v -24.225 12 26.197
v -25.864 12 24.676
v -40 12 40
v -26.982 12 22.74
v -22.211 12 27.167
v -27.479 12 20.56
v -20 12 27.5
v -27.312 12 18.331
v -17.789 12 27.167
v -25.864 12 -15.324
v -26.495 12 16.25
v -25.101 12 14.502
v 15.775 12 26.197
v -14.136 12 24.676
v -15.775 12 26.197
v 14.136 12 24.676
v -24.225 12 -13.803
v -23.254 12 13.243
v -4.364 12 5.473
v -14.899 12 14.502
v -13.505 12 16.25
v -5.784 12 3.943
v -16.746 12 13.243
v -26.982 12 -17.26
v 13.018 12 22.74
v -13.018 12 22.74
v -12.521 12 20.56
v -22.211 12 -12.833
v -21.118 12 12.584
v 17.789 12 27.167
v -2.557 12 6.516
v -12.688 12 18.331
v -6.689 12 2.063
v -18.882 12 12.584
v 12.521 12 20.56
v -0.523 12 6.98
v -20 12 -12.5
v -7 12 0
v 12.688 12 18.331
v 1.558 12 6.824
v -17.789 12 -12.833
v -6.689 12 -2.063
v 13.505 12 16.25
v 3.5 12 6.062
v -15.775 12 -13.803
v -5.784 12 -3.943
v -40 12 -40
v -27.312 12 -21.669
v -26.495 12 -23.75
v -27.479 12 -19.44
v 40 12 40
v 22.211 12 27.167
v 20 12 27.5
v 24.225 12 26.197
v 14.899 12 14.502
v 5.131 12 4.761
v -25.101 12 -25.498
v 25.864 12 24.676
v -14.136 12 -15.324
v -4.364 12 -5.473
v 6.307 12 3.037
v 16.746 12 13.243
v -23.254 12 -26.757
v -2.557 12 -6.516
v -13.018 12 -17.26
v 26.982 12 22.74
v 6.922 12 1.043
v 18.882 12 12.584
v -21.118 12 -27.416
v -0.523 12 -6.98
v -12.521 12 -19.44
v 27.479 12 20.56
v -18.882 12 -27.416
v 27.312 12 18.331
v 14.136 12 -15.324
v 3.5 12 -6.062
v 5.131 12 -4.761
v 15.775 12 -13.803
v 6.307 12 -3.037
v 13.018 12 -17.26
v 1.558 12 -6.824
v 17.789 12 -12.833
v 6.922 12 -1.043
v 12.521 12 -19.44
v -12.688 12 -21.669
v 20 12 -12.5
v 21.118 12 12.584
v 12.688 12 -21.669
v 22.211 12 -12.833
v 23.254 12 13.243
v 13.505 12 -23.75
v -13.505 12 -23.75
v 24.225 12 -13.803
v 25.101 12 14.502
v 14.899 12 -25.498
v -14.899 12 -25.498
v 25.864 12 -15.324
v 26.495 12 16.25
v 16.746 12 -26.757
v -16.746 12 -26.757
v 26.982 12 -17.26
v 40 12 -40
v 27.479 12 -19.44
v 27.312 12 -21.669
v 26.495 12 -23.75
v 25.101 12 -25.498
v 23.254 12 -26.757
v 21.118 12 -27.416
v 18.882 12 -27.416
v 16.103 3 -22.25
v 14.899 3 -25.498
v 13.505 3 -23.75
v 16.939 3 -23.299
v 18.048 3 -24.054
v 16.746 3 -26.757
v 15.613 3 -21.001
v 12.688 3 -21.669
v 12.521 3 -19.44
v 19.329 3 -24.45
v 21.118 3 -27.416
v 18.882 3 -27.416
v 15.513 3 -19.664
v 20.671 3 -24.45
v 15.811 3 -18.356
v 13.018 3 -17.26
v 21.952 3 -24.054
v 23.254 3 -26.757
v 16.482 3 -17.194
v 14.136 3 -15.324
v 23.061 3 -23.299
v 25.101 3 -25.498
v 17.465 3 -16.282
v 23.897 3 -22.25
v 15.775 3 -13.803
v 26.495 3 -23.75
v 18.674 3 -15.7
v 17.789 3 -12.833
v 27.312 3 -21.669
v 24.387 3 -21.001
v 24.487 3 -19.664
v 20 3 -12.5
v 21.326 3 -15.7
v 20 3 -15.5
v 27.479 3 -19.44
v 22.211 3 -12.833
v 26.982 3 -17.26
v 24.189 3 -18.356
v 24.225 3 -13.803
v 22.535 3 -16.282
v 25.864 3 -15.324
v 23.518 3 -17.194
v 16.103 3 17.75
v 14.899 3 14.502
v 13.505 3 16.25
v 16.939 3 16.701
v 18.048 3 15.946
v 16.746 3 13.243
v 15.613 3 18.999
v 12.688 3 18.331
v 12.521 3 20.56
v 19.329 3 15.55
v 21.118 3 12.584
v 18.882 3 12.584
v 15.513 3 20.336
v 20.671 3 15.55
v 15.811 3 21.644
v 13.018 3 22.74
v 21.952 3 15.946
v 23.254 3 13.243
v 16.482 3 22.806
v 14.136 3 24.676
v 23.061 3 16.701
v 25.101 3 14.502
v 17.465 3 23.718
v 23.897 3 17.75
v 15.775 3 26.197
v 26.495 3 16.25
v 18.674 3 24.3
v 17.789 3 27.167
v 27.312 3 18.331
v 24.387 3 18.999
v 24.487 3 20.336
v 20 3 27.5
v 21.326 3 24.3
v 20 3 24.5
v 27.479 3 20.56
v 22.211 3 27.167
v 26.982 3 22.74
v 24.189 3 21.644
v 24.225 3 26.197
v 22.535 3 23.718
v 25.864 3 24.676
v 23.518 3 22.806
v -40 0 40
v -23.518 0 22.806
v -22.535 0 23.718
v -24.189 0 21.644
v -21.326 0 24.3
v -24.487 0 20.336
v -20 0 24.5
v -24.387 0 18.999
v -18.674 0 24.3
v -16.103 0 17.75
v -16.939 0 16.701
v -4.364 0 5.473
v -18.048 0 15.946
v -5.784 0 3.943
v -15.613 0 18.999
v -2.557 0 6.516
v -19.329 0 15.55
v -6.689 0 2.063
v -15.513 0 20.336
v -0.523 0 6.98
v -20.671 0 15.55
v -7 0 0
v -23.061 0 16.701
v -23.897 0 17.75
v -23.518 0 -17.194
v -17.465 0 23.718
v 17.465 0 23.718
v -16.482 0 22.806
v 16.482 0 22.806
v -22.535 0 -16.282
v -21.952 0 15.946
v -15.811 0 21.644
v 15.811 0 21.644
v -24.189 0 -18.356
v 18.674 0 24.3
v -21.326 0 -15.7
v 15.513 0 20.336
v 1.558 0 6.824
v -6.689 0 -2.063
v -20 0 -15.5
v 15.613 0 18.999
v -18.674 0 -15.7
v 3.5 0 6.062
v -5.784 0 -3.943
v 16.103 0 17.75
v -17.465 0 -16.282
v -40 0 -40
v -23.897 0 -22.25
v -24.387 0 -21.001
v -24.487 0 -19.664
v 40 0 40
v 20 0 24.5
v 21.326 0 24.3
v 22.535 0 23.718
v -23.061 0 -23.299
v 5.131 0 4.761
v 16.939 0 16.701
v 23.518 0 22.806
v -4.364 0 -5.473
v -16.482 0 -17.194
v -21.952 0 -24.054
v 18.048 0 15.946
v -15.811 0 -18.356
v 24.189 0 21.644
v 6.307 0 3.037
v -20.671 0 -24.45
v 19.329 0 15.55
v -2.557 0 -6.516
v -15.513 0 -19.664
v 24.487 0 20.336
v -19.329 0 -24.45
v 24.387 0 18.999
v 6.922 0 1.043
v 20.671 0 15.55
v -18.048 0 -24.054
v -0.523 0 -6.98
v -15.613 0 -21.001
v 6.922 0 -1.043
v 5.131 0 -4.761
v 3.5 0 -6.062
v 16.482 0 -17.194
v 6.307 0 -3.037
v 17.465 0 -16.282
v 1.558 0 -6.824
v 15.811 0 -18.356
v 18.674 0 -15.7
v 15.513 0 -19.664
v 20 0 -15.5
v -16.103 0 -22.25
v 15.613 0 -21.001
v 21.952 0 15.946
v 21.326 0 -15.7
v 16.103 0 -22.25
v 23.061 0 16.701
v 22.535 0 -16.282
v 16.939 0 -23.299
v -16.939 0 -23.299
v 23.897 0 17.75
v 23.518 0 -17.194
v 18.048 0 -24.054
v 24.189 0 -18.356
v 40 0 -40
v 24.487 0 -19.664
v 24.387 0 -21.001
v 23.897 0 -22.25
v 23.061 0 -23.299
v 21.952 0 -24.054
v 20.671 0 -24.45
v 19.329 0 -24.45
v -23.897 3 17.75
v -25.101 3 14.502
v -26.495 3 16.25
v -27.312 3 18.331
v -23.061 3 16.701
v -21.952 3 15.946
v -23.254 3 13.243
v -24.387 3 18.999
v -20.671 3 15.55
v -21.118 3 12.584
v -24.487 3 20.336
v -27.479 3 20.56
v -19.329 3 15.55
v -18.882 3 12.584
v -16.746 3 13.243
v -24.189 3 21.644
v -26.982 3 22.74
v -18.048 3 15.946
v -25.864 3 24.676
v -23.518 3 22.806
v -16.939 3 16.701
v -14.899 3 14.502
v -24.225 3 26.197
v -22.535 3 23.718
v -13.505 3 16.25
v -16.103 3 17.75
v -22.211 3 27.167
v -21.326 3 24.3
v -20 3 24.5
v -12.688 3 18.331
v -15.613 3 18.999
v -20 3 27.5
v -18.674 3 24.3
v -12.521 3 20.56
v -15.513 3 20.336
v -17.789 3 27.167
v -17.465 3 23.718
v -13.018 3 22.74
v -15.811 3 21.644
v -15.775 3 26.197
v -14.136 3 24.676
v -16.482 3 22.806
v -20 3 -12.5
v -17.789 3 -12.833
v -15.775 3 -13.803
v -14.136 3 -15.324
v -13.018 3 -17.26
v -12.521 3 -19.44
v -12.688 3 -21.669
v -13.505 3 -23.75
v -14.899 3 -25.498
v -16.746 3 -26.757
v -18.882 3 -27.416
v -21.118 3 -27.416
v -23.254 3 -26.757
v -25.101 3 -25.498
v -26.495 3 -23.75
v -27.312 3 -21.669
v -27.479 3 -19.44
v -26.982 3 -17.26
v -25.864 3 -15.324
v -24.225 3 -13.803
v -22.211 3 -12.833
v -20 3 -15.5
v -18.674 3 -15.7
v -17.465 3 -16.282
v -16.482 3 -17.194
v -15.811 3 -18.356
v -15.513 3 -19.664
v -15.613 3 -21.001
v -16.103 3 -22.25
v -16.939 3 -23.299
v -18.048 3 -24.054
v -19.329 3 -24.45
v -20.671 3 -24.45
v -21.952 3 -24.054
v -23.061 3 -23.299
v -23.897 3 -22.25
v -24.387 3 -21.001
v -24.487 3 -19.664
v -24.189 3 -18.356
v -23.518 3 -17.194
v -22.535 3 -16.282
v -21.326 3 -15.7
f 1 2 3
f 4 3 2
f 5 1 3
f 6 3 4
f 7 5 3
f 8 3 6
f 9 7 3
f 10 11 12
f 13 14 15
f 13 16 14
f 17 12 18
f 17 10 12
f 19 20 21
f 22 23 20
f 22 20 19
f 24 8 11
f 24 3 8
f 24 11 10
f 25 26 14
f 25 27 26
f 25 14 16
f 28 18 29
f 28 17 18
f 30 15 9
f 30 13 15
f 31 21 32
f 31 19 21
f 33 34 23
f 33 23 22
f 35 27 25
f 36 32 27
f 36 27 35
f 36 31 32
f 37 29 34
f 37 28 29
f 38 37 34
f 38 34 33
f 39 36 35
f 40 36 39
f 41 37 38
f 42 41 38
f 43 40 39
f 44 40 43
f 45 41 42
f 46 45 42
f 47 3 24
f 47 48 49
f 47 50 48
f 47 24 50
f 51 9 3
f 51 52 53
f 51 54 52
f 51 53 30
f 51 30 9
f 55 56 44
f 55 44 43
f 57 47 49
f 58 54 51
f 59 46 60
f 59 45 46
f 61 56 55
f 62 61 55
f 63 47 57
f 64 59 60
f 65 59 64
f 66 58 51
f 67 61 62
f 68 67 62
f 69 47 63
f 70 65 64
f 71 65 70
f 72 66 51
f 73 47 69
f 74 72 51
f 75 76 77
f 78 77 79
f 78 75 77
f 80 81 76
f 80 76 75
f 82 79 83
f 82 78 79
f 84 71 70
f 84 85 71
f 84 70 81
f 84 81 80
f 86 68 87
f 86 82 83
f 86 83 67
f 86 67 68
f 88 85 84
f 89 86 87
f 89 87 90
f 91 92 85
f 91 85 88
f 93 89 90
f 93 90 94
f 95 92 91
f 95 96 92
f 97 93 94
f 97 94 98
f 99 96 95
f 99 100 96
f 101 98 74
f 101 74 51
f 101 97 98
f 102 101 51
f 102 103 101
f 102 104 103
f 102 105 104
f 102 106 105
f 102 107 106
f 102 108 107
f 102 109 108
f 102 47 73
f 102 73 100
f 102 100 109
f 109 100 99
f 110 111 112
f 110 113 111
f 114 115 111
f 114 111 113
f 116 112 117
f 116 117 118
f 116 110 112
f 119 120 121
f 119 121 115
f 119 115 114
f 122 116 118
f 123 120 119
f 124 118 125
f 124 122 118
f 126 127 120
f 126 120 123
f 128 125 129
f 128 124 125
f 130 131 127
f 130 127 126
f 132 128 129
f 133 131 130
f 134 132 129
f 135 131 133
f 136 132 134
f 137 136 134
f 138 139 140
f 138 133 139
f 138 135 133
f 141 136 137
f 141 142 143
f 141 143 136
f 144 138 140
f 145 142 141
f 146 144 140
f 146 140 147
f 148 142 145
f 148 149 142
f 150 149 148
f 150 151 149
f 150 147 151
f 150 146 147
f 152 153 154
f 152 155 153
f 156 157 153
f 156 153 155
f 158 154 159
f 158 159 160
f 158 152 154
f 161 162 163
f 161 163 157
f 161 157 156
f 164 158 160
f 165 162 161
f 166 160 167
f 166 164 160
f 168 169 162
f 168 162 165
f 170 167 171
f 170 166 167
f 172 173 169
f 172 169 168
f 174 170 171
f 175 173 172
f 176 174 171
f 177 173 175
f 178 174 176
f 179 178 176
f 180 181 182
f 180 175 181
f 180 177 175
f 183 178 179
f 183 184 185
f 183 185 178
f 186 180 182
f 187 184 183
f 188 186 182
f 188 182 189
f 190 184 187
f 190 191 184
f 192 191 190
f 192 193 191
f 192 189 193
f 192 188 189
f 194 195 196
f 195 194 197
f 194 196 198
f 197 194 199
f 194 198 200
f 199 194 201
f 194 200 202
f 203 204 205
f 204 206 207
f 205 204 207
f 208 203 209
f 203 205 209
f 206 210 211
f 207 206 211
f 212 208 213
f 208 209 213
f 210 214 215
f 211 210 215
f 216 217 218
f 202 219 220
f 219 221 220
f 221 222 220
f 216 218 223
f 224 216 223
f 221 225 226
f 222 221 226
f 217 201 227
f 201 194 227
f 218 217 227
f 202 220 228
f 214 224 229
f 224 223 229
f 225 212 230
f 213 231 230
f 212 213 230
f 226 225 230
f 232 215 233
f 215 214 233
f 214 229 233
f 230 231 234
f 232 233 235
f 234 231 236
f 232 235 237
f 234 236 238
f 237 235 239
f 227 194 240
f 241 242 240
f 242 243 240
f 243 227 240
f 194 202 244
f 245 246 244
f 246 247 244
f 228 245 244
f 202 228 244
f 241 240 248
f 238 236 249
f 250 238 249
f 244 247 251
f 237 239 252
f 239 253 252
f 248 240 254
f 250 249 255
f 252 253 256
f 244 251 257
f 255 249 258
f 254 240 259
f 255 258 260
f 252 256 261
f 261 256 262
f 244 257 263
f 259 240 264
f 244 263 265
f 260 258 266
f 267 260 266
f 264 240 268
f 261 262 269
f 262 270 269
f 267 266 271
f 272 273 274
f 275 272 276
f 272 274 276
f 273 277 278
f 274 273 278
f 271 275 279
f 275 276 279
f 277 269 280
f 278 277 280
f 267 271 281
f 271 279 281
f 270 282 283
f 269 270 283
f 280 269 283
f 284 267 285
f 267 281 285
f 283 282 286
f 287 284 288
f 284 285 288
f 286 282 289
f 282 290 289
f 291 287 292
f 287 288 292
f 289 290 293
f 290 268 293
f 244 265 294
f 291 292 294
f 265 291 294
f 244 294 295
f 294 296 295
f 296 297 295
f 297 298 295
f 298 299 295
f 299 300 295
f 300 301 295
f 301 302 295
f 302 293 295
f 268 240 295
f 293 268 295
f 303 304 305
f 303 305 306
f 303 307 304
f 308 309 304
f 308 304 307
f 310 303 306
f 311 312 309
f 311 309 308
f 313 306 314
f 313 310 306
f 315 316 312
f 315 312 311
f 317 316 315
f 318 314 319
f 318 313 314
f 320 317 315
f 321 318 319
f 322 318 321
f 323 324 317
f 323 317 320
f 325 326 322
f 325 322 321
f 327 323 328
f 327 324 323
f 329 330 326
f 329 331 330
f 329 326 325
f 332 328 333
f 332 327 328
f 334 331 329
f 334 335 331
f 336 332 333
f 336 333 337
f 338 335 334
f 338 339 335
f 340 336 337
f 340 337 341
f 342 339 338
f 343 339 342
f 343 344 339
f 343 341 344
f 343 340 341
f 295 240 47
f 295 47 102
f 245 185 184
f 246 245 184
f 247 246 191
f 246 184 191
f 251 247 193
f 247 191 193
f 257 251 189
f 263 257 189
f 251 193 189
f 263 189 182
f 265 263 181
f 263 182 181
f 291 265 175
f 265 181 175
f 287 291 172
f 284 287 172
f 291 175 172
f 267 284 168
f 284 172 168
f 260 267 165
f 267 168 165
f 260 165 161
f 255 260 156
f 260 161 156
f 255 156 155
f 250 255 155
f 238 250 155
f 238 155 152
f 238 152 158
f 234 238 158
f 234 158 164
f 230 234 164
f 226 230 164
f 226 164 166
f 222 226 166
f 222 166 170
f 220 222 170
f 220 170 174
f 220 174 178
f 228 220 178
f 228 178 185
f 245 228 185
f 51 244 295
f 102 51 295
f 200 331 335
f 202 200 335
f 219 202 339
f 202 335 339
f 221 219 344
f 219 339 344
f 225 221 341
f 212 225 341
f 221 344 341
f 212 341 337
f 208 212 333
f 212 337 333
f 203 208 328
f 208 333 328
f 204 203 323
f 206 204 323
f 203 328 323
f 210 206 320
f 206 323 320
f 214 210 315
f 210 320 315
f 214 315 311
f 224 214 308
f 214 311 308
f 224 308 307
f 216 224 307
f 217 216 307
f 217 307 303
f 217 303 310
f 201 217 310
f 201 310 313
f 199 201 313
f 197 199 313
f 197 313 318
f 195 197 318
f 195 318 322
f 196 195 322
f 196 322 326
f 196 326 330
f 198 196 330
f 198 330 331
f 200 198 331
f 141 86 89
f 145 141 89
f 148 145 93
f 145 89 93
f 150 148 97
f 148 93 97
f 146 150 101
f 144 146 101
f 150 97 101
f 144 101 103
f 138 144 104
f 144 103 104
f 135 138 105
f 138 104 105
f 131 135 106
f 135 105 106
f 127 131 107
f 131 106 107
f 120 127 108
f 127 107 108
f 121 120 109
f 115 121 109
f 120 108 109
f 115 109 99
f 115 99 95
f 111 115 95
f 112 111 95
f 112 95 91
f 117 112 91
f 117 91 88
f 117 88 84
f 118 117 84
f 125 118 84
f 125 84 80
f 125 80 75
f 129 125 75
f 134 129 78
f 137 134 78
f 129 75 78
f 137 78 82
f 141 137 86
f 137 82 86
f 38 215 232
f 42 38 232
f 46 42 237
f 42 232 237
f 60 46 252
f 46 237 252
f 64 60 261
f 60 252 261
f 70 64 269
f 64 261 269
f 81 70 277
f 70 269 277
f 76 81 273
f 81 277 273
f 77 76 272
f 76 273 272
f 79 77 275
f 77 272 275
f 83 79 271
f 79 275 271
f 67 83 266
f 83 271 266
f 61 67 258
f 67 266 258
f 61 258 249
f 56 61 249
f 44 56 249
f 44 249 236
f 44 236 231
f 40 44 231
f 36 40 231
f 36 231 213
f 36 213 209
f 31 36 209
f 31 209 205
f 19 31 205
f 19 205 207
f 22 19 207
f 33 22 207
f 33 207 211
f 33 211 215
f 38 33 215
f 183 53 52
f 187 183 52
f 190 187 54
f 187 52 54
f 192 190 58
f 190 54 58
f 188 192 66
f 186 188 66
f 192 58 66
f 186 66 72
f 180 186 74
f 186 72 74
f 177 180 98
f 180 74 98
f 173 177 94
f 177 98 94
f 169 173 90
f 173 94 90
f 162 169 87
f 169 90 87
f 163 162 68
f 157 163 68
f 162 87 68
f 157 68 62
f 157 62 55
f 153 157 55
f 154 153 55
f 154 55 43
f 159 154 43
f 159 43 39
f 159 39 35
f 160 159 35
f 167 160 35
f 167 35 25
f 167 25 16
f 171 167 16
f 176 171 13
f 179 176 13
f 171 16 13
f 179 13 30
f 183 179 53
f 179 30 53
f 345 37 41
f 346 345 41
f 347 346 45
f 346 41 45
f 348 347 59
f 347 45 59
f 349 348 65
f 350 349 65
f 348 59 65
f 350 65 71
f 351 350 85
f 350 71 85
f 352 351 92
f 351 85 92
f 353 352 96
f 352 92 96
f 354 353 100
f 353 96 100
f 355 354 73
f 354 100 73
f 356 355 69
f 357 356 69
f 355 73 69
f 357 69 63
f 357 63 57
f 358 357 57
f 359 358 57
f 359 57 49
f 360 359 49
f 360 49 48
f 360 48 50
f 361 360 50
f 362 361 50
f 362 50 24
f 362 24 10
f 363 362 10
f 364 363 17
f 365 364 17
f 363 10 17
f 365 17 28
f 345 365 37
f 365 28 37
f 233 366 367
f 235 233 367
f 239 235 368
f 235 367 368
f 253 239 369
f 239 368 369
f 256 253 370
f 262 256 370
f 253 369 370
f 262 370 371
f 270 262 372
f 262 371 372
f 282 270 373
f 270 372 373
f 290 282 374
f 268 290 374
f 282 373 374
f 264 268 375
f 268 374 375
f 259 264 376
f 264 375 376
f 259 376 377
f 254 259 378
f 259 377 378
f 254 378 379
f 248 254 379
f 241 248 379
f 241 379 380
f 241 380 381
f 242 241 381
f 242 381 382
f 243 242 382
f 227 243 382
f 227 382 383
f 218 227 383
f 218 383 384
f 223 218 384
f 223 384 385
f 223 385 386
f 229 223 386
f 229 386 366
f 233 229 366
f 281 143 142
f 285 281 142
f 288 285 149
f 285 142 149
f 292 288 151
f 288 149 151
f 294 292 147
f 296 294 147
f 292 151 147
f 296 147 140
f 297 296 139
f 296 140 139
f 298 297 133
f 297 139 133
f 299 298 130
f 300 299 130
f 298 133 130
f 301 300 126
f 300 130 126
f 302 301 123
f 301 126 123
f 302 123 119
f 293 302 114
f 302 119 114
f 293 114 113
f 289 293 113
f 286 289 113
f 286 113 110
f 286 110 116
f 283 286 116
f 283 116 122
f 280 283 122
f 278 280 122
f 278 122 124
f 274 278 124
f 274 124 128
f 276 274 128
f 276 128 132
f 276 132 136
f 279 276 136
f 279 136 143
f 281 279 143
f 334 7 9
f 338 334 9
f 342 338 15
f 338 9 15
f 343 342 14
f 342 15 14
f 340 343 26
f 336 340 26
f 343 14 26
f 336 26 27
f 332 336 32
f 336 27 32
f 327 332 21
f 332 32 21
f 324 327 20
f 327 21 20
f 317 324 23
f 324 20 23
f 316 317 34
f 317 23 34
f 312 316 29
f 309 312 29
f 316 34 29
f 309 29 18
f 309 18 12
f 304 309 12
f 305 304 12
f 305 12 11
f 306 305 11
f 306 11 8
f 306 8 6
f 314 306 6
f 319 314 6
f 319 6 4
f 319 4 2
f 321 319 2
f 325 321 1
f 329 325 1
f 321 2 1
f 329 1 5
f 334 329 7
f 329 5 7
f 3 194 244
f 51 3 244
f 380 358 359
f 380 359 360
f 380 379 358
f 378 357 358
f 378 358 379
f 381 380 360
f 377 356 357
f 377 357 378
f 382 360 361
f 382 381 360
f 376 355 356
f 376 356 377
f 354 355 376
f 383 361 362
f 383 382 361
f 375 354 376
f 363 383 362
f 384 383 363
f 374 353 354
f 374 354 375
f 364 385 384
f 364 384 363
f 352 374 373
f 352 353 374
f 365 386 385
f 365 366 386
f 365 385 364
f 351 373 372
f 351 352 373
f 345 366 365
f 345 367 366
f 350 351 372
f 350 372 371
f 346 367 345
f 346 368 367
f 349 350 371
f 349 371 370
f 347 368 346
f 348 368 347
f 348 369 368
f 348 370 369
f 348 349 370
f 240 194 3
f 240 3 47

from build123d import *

# Parameters (mm, degrees)
SKETCH_1_W             = 80
SKETCH_1_H             = 80
EXTRUDE_1_DEPTH        = 12
HOLE_WIZARD_M161_D     = 14
HOLE_WIZARD_M161_DEPTH = 12
SKETCH_12_R            = 4.5
CUT_EXTRUDE_1_DEPTH    = 13
SKETCH_13_R            = 7.5
CUT_EXTRUDE_2_DEPTH    = 9


with BuildPart() as part:
    # Эскиз1 → Бобышка-Вытянуть1 (new body)
    with BuildSketch(Plane(origin=(0, 0, 0), x_dir=(1, 0, 0), z_dir=(0, 1, 0))):
        Rectangle(SKETCH_1_W, SKETCH_1_H)
    extrude(amount=EXTRUDE_1_DEPTH)

    # Отверстие обработанное метчиком M161
    with Locations(Plane(origin=(0, 12, 0), x_dir=(1, 0, 0), z_dir=(0, 1, 0))):
        with Locations((0, 0)):
            Hole(HOLE_WIZARD_M161_D / 2, depth=HOLE_WIZARD_M161_DEPTH)

    # Эскиз12 → Вырез-Вытянуть1 (cut, through all)
    with BuildSketch(Plane(origin=(0, 12, 0), x_dir=(1, 0, 0), z_dir=(0, 1, 0))):
        with Locations(Location((-20, 20, 0), (0, 0, 270))):  # turned: the seam where the file's is
            Circle(SKETCH_12_R)
        with Locations(Location((20, 20, 0), (0, 0, 270))):  # turned: the seam where the file's is
            Circle(SKETCH_12_R)
        with Locations(Location((20, -20, 0), (0, 0, 270))):  # turned: the seam where the file's is
            Circle(SKETCH_12_R)
        with Locations(Location((-20, -20, 0), (0, 0, 270))):  # turned: the seam where the file's is
            Circle(SKETCH_12_R)
    extrude(amount=-CUT_EXTRUDE_1_DEPTH, mode=Mode.SUBTRACT)

    # Эскиз13 → Вырез-Вытянуть2 (cut)
    with BuildSketch(Plane(origin=(0, 12, 0), x_dir=(1, 0, 0), z_dir=(0, 1, 0))):
        with Locations(Location((-20, 20, 0), (0, 0, 270))):  # turned: the seam where the file's is
            Circle(SKETCH_13_R)
        with Locations(Location((20, 20, 0), (0, 0, 270))):  # turned: the seam where the file's is
            Circle(SKETCH_13_R)
        with Locations(Location((20, -20, 0), (0, 0, 270))):  # turned: the seam where the file's is
            Circle(SKETCH_13_R)
        with Locations(Location((-20, -20, 0), (0, 0, 270))):  # turned: the seam where the file's is
            Circle(SKETCH_13_R)
    extrude(amount=-CUT_EXTRUDE_2_DEPTH, mode=Mode.SUBTRACT)


solid = part.part
